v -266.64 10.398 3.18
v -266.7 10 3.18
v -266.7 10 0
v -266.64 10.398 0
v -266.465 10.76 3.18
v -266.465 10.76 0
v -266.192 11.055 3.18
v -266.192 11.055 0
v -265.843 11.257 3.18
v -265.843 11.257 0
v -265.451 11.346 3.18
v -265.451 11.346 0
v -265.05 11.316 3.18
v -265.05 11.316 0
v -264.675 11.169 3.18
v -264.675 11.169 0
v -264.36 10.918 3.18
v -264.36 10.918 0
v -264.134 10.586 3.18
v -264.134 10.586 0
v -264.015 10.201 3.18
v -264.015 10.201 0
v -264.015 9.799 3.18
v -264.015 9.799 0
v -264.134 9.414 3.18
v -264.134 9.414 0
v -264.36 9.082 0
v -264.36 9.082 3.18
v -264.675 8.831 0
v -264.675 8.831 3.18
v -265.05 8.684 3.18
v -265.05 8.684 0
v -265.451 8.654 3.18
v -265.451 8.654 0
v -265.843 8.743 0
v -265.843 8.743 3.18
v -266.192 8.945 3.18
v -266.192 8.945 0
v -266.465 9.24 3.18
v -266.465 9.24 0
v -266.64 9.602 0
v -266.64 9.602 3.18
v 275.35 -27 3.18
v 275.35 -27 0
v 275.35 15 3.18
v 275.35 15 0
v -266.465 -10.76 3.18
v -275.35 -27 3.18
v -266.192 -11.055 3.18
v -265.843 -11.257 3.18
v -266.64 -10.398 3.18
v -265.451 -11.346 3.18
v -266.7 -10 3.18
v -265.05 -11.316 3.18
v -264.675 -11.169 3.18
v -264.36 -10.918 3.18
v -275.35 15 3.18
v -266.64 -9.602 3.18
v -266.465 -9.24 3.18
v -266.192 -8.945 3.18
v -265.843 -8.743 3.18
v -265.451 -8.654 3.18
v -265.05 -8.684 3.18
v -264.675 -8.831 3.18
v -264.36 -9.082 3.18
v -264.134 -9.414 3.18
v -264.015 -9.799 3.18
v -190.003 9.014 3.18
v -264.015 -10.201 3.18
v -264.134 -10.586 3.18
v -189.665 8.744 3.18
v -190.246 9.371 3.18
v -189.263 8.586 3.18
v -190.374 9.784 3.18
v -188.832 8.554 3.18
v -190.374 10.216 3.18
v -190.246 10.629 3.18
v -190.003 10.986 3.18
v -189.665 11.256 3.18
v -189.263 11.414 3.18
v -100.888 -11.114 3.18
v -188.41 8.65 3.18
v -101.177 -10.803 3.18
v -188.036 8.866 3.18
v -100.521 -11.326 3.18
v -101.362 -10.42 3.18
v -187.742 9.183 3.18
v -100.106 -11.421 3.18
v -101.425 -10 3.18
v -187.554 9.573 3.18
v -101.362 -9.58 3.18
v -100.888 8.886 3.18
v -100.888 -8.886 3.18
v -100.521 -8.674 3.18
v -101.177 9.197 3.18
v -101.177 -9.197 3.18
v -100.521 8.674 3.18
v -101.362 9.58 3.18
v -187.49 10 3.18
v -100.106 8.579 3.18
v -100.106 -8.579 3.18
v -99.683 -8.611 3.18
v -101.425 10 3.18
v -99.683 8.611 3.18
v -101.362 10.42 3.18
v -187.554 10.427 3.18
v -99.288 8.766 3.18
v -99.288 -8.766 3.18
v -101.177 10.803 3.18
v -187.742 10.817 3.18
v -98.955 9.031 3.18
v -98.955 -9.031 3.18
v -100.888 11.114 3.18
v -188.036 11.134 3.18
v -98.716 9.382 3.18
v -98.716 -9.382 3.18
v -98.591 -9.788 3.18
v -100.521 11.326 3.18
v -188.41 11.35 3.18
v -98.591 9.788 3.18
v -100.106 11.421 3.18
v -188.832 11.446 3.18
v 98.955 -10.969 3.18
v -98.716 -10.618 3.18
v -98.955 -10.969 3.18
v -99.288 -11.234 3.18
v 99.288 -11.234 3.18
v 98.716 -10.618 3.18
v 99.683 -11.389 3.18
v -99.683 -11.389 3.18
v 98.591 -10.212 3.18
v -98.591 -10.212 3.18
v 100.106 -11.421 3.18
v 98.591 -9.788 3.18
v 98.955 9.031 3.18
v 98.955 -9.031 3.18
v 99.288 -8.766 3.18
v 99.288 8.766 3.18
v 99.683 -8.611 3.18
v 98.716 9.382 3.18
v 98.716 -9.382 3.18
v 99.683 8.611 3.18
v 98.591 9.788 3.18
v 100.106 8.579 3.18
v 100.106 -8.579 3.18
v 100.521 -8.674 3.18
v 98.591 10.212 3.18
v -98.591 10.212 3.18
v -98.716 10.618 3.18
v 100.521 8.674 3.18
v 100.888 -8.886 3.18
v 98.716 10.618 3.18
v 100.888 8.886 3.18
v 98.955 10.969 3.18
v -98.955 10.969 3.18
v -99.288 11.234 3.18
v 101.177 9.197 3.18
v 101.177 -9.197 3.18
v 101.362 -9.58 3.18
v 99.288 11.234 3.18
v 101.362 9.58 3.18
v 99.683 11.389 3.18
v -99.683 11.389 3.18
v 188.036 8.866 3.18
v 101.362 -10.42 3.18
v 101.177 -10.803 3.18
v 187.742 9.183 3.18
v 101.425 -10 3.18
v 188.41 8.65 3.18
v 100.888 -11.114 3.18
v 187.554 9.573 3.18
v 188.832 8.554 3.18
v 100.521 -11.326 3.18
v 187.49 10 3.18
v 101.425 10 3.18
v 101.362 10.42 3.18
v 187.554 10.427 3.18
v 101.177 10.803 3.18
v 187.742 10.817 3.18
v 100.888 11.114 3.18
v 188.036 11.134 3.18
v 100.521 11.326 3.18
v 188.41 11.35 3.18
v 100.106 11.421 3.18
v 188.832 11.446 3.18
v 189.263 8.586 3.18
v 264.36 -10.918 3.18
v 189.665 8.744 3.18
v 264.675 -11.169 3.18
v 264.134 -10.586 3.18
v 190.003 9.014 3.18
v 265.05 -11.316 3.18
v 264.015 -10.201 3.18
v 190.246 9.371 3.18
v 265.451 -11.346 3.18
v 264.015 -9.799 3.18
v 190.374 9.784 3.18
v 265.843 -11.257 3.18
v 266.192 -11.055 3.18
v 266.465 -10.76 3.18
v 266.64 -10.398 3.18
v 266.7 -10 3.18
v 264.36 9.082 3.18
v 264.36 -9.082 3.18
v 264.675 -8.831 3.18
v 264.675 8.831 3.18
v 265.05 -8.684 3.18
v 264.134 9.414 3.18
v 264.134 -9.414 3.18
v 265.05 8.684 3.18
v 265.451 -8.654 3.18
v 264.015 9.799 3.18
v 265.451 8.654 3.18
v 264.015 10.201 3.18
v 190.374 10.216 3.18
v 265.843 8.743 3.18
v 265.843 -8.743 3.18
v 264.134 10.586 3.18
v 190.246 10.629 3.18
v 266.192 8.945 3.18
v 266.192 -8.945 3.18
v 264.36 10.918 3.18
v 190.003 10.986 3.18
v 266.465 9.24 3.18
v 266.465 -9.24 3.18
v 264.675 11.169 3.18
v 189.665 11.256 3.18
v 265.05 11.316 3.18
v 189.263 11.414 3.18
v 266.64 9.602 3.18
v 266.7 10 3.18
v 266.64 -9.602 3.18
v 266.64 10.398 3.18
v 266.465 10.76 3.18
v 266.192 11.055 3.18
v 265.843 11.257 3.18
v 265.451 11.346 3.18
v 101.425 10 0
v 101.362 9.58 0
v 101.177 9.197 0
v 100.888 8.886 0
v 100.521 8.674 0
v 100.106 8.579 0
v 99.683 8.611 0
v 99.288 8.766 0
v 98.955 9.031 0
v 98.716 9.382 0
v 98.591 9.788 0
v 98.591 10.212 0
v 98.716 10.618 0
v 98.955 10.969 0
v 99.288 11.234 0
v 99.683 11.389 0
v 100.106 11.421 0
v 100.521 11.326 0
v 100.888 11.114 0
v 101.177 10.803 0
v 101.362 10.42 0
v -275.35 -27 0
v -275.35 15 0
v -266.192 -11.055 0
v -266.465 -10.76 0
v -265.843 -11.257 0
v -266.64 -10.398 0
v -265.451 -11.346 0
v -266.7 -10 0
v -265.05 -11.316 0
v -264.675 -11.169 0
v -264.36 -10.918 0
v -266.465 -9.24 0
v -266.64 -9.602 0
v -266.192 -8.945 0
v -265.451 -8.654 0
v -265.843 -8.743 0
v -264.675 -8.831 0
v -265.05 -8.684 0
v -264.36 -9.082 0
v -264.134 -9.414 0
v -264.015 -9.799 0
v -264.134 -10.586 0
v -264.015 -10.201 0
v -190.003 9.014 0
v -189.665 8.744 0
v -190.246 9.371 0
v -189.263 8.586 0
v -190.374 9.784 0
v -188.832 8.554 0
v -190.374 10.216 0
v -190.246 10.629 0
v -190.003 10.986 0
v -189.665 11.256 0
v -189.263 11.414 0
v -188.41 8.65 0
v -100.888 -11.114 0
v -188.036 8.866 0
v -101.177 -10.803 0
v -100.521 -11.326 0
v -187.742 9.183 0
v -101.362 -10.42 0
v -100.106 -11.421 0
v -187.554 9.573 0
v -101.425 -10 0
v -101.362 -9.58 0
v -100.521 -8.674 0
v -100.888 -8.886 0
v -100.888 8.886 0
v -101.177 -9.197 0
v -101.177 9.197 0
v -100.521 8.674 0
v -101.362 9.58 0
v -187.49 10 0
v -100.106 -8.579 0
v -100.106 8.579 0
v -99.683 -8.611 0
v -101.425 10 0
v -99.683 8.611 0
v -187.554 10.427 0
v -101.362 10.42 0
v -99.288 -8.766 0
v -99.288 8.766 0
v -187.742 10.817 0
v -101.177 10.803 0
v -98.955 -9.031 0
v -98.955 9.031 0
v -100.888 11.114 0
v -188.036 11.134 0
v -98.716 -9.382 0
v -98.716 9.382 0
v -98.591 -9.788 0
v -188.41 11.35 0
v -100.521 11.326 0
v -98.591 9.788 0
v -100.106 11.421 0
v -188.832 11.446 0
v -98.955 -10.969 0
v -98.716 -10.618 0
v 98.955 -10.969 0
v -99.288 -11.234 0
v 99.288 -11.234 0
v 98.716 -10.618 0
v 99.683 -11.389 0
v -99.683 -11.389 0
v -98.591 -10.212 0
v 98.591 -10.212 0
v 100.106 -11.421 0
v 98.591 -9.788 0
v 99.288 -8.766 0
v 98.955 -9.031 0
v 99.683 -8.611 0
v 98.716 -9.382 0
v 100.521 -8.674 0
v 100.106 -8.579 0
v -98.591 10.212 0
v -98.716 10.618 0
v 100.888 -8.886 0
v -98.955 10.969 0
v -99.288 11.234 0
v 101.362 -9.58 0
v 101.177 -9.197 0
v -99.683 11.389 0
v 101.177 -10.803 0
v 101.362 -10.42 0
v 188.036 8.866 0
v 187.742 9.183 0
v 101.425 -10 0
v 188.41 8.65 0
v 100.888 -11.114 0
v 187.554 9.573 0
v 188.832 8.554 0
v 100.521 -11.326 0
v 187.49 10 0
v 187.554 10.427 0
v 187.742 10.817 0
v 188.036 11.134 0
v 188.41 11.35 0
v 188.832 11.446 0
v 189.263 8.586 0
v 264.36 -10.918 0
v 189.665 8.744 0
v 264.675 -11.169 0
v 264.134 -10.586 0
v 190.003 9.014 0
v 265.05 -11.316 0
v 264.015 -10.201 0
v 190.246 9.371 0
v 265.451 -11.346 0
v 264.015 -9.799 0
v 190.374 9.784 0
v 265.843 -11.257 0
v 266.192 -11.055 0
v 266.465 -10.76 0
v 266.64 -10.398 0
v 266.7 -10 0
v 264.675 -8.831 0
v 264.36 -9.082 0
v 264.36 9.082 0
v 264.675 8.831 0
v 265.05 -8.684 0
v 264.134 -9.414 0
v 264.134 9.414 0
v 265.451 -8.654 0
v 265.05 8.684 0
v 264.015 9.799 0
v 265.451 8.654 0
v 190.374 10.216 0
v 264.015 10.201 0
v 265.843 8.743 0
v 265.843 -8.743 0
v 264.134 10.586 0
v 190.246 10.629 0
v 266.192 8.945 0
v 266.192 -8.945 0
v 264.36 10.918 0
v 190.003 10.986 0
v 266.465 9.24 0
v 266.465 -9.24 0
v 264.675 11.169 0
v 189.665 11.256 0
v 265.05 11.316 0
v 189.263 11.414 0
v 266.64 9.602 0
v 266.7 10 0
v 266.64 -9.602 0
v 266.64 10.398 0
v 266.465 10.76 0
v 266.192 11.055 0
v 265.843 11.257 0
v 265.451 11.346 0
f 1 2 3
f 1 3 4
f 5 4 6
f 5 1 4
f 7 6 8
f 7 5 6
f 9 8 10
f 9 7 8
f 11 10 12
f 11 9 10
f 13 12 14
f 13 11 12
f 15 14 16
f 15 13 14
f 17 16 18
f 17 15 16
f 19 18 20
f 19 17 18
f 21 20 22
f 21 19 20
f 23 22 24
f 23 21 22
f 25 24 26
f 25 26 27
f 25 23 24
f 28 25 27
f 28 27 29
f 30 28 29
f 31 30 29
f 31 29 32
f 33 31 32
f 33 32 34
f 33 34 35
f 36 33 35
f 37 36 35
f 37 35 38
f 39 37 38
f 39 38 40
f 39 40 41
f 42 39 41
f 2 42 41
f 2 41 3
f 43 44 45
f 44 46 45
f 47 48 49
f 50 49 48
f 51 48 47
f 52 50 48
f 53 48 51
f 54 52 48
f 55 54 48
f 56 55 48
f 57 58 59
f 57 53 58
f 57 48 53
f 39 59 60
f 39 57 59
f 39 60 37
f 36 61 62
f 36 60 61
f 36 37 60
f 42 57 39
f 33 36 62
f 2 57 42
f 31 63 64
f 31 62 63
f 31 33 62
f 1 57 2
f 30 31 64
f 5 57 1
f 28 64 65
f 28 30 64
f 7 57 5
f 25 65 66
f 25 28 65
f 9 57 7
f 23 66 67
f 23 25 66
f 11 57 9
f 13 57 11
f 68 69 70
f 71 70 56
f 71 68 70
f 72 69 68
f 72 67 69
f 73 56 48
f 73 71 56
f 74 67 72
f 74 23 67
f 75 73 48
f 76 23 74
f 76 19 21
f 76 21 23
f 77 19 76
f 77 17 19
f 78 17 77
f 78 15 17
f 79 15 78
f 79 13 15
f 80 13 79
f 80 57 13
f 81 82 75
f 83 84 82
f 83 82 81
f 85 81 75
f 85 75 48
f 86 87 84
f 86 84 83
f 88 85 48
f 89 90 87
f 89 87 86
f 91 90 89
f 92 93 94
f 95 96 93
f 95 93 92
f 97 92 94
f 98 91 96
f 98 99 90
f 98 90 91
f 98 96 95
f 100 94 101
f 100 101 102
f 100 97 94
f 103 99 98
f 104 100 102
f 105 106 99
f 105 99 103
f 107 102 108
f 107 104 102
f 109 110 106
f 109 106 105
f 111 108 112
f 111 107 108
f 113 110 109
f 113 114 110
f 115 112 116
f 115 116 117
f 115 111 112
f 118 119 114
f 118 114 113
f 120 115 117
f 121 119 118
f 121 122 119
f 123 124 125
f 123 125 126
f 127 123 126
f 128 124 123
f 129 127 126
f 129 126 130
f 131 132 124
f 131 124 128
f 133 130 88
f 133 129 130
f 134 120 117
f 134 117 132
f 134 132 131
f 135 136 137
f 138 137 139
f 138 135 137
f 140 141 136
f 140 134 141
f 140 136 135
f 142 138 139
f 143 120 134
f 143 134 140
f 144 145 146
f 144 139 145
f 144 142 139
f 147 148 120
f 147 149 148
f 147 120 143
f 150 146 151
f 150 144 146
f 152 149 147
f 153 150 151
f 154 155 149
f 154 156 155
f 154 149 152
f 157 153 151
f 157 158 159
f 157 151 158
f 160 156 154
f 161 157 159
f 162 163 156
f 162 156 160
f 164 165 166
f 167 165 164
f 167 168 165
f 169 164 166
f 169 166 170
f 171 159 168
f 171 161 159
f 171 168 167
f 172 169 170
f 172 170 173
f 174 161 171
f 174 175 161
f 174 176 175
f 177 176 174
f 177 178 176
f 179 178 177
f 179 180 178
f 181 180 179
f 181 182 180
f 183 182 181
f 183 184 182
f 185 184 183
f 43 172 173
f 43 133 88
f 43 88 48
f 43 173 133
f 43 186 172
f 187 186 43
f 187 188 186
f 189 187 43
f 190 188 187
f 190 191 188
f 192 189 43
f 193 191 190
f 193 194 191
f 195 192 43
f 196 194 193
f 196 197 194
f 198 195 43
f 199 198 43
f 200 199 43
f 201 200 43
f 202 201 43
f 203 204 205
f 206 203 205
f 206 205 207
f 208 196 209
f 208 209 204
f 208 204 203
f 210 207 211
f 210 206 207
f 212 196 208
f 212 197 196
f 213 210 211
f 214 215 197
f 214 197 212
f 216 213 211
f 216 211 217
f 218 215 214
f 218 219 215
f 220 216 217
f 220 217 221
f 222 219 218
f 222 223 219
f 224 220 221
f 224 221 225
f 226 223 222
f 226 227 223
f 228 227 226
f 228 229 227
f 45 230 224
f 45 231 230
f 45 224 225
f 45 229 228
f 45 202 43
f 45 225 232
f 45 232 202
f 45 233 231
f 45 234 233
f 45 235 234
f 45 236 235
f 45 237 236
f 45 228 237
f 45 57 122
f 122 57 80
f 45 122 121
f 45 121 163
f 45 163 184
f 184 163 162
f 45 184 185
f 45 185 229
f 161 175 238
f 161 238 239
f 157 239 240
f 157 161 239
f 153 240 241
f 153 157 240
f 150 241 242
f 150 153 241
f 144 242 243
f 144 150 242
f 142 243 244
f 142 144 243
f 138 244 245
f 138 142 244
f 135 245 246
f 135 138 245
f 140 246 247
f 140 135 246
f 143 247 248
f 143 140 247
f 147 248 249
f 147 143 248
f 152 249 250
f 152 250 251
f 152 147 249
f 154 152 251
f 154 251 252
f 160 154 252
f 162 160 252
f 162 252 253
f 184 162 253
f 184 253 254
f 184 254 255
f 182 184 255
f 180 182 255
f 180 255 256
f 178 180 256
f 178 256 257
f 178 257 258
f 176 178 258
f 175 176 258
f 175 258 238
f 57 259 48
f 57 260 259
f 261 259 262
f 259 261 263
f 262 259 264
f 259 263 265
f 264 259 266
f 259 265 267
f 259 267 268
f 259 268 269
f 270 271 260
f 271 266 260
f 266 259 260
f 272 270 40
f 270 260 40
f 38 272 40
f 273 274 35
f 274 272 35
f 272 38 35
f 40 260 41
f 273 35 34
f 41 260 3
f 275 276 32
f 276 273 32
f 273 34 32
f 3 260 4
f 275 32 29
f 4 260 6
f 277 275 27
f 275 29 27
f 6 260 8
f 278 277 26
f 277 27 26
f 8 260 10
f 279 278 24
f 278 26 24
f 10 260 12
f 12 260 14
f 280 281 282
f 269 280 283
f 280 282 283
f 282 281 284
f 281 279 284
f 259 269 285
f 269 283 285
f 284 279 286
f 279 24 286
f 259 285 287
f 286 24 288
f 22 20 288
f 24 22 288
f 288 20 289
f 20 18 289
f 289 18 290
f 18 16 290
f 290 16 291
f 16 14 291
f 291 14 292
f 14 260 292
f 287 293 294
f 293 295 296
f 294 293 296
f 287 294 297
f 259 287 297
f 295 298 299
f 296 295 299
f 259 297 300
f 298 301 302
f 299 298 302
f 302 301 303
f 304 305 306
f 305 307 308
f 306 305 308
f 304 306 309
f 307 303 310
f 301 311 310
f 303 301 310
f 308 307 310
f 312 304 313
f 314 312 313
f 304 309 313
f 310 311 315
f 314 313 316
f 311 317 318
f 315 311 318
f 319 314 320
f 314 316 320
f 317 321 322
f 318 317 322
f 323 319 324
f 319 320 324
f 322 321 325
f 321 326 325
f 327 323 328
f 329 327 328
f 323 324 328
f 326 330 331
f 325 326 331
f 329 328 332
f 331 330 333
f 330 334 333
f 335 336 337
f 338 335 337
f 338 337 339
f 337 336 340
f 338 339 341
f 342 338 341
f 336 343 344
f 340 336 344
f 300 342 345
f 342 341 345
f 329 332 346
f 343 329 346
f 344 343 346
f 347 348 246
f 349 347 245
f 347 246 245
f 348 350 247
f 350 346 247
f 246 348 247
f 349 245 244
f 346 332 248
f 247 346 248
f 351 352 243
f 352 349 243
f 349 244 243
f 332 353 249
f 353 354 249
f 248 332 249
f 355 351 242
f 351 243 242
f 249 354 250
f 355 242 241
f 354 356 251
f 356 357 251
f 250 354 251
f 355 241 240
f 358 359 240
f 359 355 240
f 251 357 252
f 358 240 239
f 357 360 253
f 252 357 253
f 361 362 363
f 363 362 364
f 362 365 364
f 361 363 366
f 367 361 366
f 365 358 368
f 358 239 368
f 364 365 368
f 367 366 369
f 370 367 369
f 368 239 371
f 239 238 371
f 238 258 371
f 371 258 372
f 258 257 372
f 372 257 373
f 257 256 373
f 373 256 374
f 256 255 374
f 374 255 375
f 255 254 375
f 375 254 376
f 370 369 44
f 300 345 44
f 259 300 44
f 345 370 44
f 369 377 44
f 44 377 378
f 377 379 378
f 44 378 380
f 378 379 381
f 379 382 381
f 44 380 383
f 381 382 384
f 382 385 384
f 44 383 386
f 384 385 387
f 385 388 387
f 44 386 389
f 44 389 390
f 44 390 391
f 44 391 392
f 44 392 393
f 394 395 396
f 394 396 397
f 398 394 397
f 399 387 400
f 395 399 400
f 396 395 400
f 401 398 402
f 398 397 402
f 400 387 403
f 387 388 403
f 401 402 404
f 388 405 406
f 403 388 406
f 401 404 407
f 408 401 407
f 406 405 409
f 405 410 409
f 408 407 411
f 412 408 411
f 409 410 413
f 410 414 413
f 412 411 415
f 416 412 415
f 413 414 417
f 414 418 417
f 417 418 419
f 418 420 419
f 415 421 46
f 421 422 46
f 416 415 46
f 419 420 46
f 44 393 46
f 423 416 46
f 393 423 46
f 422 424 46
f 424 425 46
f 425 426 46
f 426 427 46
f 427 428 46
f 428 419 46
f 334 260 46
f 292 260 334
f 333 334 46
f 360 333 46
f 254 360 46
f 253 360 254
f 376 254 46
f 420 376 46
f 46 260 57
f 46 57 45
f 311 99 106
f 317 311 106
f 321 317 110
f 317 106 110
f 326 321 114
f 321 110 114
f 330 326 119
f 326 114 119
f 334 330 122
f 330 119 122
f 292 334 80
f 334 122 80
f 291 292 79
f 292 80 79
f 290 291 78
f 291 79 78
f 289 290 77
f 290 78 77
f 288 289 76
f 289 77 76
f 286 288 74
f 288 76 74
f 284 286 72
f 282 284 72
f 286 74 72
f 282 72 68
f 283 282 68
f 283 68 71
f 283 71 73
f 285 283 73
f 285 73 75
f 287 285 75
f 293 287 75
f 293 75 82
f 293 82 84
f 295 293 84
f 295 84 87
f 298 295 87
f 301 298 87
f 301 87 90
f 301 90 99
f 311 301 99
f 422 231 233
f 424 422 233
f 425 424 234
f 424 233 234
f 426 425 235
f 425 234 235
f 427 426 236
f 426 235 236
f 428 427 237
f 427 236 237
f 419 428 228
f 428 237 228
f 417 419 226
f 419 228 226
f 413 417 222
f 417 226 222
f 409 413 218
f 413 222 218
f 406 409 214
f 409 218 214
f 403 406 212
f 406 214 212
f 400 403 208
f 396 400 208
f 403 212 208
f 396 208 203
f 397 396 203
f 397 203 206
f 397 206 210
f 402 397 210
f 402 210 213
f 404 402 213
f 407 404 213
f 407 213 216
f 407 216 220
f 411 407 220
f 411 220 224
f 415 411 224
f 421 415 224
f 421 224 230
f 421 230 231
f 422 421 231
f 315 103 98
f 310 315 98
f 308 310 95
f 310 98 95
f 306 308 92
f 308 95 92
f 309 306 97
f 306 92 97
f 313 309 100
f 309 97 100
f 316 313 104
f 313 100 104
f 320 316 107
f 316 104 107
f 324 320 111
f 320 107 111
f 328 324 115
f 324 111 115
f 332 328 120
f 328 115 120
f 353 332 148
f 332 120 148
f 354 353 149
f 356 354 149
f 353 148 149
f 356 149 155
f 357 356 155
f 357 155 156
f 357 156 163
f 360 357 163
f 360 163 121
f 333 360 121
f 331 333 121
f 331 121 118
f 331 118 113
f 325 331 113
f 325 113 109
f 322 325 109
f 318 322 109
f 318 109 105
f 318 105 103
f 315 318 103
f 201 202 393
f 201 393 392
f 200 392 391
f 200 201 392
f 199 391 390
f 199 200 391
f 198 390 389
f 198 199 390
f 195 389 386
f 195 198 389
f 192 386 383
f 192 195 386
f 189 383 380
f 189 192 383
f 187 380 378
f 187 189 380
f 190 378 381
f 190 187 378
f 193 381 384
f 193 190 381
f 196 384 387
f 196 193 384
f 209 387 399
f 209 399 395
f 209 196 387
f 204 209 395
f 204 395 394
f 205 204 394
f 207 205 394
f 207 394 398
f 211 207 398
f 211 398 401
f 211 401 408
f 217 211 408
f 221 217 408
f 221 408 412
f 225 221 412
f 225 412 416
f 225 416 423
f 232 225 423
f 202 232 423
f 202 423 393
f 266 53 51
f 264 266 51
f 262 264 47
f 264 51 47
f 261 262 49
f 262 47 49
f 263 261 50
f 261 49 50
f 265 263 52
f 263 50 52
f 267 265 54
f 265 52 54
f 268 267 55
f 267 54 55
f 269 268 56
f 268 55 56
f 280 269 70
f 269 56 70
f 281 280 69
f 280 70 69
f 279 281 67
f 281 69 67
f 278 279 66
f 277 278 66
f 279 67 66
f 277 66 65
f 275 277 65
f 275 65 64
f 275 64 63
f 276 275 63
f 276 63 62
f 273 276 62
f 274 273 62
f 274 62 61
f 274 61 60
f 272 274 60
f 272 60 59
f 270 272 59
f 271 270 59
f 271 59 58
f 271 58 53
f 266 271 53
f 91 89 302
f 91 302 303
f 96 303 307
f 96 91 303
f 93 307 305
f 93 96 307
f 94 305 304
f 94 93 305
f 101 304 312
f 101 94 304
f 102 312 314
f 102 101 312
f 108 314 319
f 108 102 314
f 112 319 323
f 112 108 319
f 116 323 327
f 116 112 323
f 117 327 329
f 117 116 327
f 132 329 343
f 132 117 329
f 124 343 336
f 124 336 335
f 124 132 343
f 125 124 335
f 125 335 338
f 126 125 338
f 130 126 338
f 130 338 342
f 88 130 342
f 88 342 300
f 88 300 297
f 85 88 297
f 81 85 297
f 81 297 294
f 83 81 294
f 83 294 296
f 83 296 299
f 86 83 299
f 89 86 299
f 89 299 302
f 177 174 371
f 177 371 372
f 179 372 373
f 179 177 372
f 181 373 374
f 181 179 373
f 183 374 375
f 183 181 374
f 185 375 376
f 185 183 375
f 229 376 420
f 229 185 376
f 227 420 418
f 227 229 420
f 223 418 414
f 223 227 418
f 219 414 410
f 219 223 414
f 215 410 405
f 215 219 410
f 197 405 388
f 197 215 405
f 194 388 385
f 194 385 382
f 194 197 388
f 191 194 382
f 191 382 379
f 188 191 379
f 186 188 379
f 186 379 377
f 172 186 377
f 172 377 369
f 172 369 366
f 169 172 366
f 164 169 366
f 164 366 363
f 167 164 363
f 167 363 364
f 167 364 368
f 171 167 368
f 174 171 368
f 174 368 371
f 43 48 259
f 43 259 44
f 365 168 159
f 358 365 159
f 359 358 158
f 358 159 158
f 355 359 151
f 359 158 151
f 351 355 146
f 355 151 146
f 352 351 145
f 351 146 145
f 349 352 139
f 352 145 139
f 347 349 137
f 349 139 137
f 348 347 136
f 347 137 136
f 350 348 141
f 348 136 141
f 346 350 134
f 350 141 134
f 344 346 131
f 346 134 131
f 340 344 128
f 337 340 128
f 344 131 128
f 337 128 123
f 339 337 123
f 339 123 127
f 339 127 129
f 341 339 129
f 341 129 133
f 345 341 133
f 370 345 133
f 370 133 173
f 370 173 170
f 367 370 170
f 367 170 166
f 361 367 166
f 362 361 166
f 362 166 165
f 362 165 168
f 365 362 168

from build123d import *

# Parameters (mm, degrees)
SKETCH3_W               = 550.7
SKETCH3_H               = 30
BOSS_EXTRUDE3_DEPTH     = 3.18
CUT_EXTRUDE1_REACH      = 277.777
SKETCH4_R               = 1.35
MIRROR2_COPY_1_REACH    = 277.777
MIRROR2_COPY_1_SKETCH_R = 1.35
CUT_EXTRUDE2_REACH      = 277.777
SKETCH5_R               = 1.425
MIRROR4_COPY_1_REACH    = 277.777
MIRROR4_COPY_1_SKETCH_R = 1.425
SKETCH6_W               = 550.7
SKETCH6_H               = 3.18
BOSS_EXTRUDE4_DEPTH     = 12
CUT_EXTRUDE3_REACH      = 278.689
SKETCH7_R               = 1.45


with BuildPart() as part:
    # Sketch3 → Boss-Extrude3 (new body)
    with BuildSketch(Plane.XY):
        Rectangle(SKETCH3_W, SKETCH3_H)
    extrude(amount=BOSS_EXTRUDE3_DEPTH)

    # Sketch4 → Cut-Extrude1 (cut, up to next)
    with BuildSketch(Plane.XY.offset(3.18), mode=Mode.PRIVATE) as cut_extrude1_sk1:
        with Locations((265.35, 10)):
            Circle(SKETCH4_R)
    cut_extrude1_tool1 = extrude(cut_extrude1_sk1.sketch, amount=-CUT_EXTRUDE1_REACH, mode=Mode.PRIVATE) & part.part
    cut_extrude1 = cut_extrude1_tool1.solids().sort_by_distance((265.35, 10, 3.18))[0]
    add(cut_extrude1, mode=Mode.SUBTRACT)

    # Mirror1: Cut-Extrude1 across plane
    add(cut_extrude1.mirror(Plane.ZX), mode=Mode.SUBTRACT)

    # Mirror2: Cut-Extrude1 across plane
    add(cut_extrude1.mirror(Plane(origin=(0, 0, 0), x_dir=(0, 0, 1), z_dir=(1, 0, 0))), mode=Mode.SUBTRACT)

    # Mirror2 copy 1 sketch → Mirror2 copy 1 (cut, up to next)
    with BuildSketch(Plane(origin=(0, 0, 3.18), x_dir=(-1, 0, 0), z_dir=(0, 0, 1)), mode=Mode.PRIVATE) as mirror2_copy_1_sk1:
        with Locations((265.35, 10)):
            Circle(MIRROR2_COPY_1_SKETCH_R)
    mirror2_copy_1_tool1 = extrude(mirror2_copy_1_sk1.sketch, amount=-MIRROR2_COPY_1_REACH, mode=Mode.PRIVATE) & part.part
    add(mirror2_copy_1_tool1.solids().sort_by_distance((-265.35, -10, 3.18))[0], mode=Mode.SUBTRACT)

    # Sketch5 → Cut-Extrude2 (cut, up to next)
    with BuildSketch(Plane.XY.offset(3.18), mode=Mode.PRIVATE) as cut_extrude2_sk1:
        with Locations((100, -10)):
            Circle(SKETCH5_R)
    cut_extrude2_tool1 = extrude(cut_extrude2_sk1.sketch, amount=-CUT_EXTRUDE2_REACH, mode=Mode.PRIVATE) & part.part
    cut_extrude2 = cut_extrude2_tool1.solids().sort_by_distance((100, -10, 3.18))[0]
    add(cut_extrude2, mode=Mode.SUBTRACT)

    # Mirror3: Cut-Extrude2 across plane
    add(cut_extrude2.mirror(Plane(origin=(0, 0, 0), x_dir=(0, 0, 1), z_dir=(1, 0, 0))), mode=Mode.SUBTRACT)

    # Mirror4: Cut-Extrude2 across plane
    add(cut_extrude2.mirror(Plane.ZX), mode=Mode.SUBTRACT)

    # Mirror4 copy 1 sketch → Mirror4 copy 1 (cut, up to next)
    with BuildSketch(Plane(origin=(0, 0, 3.18), x_dir=(-1, 0, 0), z_dir=(0, 0, 1)), mode=Mode.PRIVATE) as mirror4_copy_1_sk1:
        with Locations((100, -10)):
            Circle(MIRROR4_COPY_1_SKETCH_R)
    mirror4_copy_1_tool1 = extrude(mirror4_copy_1_sk1.sketch, amount=-MIRROR4_COPY_1_REACH, mode=Mode.PRIVATE) & part.part
    add(mirror4_copy_1_tool1.solids().sort_by_distance((-100, 10, 3.18))[0], mode=Mode.SUBTRACT)

    # Sketch6 → Boss-Extrude4 (add)
    with BuildSketch(Plane.XZ.offset(15)):
        with Locations((0, 1.59)):
            Rectangle(SKETCH6_W, SKETCH6_H)
    extrude(amount=BOSS_EXTRUDE4_DEPTH)

    # Sketch7 → Cut-Extrude3 (cut, up to next)
    with BuildSketch(Plane.XY.offset(3.18), mode=Mode.PRIVATE) as cut_extrude3_sk1:
        with Locations((-188.94, 10)):
            Circle(SKETCH7_R)
    cut_extrude3_tool1 = extrude(cut_extrude3_sk1.sketch, amount=-CUT_EXTRUDE3_REACH, mode=Mode.PRIVATE) & part.part
    cut_extrude3 = cut_extrude3_tool1.solids().sort_by_distance((-188.94, 10, 3.18))[0]
    add(cut_extrude3, mode=Mode.SUBTRACT)

    # Mirror5: Cut-Extrude3 across plane
    add(cut_extrude3.mirror(Plane(origin=(0, 0, 0), x_dir=(0, 0, 1), z_dir=(1, 0, 0))), mode=Mode.SUBTRACT)


solid = part.part
